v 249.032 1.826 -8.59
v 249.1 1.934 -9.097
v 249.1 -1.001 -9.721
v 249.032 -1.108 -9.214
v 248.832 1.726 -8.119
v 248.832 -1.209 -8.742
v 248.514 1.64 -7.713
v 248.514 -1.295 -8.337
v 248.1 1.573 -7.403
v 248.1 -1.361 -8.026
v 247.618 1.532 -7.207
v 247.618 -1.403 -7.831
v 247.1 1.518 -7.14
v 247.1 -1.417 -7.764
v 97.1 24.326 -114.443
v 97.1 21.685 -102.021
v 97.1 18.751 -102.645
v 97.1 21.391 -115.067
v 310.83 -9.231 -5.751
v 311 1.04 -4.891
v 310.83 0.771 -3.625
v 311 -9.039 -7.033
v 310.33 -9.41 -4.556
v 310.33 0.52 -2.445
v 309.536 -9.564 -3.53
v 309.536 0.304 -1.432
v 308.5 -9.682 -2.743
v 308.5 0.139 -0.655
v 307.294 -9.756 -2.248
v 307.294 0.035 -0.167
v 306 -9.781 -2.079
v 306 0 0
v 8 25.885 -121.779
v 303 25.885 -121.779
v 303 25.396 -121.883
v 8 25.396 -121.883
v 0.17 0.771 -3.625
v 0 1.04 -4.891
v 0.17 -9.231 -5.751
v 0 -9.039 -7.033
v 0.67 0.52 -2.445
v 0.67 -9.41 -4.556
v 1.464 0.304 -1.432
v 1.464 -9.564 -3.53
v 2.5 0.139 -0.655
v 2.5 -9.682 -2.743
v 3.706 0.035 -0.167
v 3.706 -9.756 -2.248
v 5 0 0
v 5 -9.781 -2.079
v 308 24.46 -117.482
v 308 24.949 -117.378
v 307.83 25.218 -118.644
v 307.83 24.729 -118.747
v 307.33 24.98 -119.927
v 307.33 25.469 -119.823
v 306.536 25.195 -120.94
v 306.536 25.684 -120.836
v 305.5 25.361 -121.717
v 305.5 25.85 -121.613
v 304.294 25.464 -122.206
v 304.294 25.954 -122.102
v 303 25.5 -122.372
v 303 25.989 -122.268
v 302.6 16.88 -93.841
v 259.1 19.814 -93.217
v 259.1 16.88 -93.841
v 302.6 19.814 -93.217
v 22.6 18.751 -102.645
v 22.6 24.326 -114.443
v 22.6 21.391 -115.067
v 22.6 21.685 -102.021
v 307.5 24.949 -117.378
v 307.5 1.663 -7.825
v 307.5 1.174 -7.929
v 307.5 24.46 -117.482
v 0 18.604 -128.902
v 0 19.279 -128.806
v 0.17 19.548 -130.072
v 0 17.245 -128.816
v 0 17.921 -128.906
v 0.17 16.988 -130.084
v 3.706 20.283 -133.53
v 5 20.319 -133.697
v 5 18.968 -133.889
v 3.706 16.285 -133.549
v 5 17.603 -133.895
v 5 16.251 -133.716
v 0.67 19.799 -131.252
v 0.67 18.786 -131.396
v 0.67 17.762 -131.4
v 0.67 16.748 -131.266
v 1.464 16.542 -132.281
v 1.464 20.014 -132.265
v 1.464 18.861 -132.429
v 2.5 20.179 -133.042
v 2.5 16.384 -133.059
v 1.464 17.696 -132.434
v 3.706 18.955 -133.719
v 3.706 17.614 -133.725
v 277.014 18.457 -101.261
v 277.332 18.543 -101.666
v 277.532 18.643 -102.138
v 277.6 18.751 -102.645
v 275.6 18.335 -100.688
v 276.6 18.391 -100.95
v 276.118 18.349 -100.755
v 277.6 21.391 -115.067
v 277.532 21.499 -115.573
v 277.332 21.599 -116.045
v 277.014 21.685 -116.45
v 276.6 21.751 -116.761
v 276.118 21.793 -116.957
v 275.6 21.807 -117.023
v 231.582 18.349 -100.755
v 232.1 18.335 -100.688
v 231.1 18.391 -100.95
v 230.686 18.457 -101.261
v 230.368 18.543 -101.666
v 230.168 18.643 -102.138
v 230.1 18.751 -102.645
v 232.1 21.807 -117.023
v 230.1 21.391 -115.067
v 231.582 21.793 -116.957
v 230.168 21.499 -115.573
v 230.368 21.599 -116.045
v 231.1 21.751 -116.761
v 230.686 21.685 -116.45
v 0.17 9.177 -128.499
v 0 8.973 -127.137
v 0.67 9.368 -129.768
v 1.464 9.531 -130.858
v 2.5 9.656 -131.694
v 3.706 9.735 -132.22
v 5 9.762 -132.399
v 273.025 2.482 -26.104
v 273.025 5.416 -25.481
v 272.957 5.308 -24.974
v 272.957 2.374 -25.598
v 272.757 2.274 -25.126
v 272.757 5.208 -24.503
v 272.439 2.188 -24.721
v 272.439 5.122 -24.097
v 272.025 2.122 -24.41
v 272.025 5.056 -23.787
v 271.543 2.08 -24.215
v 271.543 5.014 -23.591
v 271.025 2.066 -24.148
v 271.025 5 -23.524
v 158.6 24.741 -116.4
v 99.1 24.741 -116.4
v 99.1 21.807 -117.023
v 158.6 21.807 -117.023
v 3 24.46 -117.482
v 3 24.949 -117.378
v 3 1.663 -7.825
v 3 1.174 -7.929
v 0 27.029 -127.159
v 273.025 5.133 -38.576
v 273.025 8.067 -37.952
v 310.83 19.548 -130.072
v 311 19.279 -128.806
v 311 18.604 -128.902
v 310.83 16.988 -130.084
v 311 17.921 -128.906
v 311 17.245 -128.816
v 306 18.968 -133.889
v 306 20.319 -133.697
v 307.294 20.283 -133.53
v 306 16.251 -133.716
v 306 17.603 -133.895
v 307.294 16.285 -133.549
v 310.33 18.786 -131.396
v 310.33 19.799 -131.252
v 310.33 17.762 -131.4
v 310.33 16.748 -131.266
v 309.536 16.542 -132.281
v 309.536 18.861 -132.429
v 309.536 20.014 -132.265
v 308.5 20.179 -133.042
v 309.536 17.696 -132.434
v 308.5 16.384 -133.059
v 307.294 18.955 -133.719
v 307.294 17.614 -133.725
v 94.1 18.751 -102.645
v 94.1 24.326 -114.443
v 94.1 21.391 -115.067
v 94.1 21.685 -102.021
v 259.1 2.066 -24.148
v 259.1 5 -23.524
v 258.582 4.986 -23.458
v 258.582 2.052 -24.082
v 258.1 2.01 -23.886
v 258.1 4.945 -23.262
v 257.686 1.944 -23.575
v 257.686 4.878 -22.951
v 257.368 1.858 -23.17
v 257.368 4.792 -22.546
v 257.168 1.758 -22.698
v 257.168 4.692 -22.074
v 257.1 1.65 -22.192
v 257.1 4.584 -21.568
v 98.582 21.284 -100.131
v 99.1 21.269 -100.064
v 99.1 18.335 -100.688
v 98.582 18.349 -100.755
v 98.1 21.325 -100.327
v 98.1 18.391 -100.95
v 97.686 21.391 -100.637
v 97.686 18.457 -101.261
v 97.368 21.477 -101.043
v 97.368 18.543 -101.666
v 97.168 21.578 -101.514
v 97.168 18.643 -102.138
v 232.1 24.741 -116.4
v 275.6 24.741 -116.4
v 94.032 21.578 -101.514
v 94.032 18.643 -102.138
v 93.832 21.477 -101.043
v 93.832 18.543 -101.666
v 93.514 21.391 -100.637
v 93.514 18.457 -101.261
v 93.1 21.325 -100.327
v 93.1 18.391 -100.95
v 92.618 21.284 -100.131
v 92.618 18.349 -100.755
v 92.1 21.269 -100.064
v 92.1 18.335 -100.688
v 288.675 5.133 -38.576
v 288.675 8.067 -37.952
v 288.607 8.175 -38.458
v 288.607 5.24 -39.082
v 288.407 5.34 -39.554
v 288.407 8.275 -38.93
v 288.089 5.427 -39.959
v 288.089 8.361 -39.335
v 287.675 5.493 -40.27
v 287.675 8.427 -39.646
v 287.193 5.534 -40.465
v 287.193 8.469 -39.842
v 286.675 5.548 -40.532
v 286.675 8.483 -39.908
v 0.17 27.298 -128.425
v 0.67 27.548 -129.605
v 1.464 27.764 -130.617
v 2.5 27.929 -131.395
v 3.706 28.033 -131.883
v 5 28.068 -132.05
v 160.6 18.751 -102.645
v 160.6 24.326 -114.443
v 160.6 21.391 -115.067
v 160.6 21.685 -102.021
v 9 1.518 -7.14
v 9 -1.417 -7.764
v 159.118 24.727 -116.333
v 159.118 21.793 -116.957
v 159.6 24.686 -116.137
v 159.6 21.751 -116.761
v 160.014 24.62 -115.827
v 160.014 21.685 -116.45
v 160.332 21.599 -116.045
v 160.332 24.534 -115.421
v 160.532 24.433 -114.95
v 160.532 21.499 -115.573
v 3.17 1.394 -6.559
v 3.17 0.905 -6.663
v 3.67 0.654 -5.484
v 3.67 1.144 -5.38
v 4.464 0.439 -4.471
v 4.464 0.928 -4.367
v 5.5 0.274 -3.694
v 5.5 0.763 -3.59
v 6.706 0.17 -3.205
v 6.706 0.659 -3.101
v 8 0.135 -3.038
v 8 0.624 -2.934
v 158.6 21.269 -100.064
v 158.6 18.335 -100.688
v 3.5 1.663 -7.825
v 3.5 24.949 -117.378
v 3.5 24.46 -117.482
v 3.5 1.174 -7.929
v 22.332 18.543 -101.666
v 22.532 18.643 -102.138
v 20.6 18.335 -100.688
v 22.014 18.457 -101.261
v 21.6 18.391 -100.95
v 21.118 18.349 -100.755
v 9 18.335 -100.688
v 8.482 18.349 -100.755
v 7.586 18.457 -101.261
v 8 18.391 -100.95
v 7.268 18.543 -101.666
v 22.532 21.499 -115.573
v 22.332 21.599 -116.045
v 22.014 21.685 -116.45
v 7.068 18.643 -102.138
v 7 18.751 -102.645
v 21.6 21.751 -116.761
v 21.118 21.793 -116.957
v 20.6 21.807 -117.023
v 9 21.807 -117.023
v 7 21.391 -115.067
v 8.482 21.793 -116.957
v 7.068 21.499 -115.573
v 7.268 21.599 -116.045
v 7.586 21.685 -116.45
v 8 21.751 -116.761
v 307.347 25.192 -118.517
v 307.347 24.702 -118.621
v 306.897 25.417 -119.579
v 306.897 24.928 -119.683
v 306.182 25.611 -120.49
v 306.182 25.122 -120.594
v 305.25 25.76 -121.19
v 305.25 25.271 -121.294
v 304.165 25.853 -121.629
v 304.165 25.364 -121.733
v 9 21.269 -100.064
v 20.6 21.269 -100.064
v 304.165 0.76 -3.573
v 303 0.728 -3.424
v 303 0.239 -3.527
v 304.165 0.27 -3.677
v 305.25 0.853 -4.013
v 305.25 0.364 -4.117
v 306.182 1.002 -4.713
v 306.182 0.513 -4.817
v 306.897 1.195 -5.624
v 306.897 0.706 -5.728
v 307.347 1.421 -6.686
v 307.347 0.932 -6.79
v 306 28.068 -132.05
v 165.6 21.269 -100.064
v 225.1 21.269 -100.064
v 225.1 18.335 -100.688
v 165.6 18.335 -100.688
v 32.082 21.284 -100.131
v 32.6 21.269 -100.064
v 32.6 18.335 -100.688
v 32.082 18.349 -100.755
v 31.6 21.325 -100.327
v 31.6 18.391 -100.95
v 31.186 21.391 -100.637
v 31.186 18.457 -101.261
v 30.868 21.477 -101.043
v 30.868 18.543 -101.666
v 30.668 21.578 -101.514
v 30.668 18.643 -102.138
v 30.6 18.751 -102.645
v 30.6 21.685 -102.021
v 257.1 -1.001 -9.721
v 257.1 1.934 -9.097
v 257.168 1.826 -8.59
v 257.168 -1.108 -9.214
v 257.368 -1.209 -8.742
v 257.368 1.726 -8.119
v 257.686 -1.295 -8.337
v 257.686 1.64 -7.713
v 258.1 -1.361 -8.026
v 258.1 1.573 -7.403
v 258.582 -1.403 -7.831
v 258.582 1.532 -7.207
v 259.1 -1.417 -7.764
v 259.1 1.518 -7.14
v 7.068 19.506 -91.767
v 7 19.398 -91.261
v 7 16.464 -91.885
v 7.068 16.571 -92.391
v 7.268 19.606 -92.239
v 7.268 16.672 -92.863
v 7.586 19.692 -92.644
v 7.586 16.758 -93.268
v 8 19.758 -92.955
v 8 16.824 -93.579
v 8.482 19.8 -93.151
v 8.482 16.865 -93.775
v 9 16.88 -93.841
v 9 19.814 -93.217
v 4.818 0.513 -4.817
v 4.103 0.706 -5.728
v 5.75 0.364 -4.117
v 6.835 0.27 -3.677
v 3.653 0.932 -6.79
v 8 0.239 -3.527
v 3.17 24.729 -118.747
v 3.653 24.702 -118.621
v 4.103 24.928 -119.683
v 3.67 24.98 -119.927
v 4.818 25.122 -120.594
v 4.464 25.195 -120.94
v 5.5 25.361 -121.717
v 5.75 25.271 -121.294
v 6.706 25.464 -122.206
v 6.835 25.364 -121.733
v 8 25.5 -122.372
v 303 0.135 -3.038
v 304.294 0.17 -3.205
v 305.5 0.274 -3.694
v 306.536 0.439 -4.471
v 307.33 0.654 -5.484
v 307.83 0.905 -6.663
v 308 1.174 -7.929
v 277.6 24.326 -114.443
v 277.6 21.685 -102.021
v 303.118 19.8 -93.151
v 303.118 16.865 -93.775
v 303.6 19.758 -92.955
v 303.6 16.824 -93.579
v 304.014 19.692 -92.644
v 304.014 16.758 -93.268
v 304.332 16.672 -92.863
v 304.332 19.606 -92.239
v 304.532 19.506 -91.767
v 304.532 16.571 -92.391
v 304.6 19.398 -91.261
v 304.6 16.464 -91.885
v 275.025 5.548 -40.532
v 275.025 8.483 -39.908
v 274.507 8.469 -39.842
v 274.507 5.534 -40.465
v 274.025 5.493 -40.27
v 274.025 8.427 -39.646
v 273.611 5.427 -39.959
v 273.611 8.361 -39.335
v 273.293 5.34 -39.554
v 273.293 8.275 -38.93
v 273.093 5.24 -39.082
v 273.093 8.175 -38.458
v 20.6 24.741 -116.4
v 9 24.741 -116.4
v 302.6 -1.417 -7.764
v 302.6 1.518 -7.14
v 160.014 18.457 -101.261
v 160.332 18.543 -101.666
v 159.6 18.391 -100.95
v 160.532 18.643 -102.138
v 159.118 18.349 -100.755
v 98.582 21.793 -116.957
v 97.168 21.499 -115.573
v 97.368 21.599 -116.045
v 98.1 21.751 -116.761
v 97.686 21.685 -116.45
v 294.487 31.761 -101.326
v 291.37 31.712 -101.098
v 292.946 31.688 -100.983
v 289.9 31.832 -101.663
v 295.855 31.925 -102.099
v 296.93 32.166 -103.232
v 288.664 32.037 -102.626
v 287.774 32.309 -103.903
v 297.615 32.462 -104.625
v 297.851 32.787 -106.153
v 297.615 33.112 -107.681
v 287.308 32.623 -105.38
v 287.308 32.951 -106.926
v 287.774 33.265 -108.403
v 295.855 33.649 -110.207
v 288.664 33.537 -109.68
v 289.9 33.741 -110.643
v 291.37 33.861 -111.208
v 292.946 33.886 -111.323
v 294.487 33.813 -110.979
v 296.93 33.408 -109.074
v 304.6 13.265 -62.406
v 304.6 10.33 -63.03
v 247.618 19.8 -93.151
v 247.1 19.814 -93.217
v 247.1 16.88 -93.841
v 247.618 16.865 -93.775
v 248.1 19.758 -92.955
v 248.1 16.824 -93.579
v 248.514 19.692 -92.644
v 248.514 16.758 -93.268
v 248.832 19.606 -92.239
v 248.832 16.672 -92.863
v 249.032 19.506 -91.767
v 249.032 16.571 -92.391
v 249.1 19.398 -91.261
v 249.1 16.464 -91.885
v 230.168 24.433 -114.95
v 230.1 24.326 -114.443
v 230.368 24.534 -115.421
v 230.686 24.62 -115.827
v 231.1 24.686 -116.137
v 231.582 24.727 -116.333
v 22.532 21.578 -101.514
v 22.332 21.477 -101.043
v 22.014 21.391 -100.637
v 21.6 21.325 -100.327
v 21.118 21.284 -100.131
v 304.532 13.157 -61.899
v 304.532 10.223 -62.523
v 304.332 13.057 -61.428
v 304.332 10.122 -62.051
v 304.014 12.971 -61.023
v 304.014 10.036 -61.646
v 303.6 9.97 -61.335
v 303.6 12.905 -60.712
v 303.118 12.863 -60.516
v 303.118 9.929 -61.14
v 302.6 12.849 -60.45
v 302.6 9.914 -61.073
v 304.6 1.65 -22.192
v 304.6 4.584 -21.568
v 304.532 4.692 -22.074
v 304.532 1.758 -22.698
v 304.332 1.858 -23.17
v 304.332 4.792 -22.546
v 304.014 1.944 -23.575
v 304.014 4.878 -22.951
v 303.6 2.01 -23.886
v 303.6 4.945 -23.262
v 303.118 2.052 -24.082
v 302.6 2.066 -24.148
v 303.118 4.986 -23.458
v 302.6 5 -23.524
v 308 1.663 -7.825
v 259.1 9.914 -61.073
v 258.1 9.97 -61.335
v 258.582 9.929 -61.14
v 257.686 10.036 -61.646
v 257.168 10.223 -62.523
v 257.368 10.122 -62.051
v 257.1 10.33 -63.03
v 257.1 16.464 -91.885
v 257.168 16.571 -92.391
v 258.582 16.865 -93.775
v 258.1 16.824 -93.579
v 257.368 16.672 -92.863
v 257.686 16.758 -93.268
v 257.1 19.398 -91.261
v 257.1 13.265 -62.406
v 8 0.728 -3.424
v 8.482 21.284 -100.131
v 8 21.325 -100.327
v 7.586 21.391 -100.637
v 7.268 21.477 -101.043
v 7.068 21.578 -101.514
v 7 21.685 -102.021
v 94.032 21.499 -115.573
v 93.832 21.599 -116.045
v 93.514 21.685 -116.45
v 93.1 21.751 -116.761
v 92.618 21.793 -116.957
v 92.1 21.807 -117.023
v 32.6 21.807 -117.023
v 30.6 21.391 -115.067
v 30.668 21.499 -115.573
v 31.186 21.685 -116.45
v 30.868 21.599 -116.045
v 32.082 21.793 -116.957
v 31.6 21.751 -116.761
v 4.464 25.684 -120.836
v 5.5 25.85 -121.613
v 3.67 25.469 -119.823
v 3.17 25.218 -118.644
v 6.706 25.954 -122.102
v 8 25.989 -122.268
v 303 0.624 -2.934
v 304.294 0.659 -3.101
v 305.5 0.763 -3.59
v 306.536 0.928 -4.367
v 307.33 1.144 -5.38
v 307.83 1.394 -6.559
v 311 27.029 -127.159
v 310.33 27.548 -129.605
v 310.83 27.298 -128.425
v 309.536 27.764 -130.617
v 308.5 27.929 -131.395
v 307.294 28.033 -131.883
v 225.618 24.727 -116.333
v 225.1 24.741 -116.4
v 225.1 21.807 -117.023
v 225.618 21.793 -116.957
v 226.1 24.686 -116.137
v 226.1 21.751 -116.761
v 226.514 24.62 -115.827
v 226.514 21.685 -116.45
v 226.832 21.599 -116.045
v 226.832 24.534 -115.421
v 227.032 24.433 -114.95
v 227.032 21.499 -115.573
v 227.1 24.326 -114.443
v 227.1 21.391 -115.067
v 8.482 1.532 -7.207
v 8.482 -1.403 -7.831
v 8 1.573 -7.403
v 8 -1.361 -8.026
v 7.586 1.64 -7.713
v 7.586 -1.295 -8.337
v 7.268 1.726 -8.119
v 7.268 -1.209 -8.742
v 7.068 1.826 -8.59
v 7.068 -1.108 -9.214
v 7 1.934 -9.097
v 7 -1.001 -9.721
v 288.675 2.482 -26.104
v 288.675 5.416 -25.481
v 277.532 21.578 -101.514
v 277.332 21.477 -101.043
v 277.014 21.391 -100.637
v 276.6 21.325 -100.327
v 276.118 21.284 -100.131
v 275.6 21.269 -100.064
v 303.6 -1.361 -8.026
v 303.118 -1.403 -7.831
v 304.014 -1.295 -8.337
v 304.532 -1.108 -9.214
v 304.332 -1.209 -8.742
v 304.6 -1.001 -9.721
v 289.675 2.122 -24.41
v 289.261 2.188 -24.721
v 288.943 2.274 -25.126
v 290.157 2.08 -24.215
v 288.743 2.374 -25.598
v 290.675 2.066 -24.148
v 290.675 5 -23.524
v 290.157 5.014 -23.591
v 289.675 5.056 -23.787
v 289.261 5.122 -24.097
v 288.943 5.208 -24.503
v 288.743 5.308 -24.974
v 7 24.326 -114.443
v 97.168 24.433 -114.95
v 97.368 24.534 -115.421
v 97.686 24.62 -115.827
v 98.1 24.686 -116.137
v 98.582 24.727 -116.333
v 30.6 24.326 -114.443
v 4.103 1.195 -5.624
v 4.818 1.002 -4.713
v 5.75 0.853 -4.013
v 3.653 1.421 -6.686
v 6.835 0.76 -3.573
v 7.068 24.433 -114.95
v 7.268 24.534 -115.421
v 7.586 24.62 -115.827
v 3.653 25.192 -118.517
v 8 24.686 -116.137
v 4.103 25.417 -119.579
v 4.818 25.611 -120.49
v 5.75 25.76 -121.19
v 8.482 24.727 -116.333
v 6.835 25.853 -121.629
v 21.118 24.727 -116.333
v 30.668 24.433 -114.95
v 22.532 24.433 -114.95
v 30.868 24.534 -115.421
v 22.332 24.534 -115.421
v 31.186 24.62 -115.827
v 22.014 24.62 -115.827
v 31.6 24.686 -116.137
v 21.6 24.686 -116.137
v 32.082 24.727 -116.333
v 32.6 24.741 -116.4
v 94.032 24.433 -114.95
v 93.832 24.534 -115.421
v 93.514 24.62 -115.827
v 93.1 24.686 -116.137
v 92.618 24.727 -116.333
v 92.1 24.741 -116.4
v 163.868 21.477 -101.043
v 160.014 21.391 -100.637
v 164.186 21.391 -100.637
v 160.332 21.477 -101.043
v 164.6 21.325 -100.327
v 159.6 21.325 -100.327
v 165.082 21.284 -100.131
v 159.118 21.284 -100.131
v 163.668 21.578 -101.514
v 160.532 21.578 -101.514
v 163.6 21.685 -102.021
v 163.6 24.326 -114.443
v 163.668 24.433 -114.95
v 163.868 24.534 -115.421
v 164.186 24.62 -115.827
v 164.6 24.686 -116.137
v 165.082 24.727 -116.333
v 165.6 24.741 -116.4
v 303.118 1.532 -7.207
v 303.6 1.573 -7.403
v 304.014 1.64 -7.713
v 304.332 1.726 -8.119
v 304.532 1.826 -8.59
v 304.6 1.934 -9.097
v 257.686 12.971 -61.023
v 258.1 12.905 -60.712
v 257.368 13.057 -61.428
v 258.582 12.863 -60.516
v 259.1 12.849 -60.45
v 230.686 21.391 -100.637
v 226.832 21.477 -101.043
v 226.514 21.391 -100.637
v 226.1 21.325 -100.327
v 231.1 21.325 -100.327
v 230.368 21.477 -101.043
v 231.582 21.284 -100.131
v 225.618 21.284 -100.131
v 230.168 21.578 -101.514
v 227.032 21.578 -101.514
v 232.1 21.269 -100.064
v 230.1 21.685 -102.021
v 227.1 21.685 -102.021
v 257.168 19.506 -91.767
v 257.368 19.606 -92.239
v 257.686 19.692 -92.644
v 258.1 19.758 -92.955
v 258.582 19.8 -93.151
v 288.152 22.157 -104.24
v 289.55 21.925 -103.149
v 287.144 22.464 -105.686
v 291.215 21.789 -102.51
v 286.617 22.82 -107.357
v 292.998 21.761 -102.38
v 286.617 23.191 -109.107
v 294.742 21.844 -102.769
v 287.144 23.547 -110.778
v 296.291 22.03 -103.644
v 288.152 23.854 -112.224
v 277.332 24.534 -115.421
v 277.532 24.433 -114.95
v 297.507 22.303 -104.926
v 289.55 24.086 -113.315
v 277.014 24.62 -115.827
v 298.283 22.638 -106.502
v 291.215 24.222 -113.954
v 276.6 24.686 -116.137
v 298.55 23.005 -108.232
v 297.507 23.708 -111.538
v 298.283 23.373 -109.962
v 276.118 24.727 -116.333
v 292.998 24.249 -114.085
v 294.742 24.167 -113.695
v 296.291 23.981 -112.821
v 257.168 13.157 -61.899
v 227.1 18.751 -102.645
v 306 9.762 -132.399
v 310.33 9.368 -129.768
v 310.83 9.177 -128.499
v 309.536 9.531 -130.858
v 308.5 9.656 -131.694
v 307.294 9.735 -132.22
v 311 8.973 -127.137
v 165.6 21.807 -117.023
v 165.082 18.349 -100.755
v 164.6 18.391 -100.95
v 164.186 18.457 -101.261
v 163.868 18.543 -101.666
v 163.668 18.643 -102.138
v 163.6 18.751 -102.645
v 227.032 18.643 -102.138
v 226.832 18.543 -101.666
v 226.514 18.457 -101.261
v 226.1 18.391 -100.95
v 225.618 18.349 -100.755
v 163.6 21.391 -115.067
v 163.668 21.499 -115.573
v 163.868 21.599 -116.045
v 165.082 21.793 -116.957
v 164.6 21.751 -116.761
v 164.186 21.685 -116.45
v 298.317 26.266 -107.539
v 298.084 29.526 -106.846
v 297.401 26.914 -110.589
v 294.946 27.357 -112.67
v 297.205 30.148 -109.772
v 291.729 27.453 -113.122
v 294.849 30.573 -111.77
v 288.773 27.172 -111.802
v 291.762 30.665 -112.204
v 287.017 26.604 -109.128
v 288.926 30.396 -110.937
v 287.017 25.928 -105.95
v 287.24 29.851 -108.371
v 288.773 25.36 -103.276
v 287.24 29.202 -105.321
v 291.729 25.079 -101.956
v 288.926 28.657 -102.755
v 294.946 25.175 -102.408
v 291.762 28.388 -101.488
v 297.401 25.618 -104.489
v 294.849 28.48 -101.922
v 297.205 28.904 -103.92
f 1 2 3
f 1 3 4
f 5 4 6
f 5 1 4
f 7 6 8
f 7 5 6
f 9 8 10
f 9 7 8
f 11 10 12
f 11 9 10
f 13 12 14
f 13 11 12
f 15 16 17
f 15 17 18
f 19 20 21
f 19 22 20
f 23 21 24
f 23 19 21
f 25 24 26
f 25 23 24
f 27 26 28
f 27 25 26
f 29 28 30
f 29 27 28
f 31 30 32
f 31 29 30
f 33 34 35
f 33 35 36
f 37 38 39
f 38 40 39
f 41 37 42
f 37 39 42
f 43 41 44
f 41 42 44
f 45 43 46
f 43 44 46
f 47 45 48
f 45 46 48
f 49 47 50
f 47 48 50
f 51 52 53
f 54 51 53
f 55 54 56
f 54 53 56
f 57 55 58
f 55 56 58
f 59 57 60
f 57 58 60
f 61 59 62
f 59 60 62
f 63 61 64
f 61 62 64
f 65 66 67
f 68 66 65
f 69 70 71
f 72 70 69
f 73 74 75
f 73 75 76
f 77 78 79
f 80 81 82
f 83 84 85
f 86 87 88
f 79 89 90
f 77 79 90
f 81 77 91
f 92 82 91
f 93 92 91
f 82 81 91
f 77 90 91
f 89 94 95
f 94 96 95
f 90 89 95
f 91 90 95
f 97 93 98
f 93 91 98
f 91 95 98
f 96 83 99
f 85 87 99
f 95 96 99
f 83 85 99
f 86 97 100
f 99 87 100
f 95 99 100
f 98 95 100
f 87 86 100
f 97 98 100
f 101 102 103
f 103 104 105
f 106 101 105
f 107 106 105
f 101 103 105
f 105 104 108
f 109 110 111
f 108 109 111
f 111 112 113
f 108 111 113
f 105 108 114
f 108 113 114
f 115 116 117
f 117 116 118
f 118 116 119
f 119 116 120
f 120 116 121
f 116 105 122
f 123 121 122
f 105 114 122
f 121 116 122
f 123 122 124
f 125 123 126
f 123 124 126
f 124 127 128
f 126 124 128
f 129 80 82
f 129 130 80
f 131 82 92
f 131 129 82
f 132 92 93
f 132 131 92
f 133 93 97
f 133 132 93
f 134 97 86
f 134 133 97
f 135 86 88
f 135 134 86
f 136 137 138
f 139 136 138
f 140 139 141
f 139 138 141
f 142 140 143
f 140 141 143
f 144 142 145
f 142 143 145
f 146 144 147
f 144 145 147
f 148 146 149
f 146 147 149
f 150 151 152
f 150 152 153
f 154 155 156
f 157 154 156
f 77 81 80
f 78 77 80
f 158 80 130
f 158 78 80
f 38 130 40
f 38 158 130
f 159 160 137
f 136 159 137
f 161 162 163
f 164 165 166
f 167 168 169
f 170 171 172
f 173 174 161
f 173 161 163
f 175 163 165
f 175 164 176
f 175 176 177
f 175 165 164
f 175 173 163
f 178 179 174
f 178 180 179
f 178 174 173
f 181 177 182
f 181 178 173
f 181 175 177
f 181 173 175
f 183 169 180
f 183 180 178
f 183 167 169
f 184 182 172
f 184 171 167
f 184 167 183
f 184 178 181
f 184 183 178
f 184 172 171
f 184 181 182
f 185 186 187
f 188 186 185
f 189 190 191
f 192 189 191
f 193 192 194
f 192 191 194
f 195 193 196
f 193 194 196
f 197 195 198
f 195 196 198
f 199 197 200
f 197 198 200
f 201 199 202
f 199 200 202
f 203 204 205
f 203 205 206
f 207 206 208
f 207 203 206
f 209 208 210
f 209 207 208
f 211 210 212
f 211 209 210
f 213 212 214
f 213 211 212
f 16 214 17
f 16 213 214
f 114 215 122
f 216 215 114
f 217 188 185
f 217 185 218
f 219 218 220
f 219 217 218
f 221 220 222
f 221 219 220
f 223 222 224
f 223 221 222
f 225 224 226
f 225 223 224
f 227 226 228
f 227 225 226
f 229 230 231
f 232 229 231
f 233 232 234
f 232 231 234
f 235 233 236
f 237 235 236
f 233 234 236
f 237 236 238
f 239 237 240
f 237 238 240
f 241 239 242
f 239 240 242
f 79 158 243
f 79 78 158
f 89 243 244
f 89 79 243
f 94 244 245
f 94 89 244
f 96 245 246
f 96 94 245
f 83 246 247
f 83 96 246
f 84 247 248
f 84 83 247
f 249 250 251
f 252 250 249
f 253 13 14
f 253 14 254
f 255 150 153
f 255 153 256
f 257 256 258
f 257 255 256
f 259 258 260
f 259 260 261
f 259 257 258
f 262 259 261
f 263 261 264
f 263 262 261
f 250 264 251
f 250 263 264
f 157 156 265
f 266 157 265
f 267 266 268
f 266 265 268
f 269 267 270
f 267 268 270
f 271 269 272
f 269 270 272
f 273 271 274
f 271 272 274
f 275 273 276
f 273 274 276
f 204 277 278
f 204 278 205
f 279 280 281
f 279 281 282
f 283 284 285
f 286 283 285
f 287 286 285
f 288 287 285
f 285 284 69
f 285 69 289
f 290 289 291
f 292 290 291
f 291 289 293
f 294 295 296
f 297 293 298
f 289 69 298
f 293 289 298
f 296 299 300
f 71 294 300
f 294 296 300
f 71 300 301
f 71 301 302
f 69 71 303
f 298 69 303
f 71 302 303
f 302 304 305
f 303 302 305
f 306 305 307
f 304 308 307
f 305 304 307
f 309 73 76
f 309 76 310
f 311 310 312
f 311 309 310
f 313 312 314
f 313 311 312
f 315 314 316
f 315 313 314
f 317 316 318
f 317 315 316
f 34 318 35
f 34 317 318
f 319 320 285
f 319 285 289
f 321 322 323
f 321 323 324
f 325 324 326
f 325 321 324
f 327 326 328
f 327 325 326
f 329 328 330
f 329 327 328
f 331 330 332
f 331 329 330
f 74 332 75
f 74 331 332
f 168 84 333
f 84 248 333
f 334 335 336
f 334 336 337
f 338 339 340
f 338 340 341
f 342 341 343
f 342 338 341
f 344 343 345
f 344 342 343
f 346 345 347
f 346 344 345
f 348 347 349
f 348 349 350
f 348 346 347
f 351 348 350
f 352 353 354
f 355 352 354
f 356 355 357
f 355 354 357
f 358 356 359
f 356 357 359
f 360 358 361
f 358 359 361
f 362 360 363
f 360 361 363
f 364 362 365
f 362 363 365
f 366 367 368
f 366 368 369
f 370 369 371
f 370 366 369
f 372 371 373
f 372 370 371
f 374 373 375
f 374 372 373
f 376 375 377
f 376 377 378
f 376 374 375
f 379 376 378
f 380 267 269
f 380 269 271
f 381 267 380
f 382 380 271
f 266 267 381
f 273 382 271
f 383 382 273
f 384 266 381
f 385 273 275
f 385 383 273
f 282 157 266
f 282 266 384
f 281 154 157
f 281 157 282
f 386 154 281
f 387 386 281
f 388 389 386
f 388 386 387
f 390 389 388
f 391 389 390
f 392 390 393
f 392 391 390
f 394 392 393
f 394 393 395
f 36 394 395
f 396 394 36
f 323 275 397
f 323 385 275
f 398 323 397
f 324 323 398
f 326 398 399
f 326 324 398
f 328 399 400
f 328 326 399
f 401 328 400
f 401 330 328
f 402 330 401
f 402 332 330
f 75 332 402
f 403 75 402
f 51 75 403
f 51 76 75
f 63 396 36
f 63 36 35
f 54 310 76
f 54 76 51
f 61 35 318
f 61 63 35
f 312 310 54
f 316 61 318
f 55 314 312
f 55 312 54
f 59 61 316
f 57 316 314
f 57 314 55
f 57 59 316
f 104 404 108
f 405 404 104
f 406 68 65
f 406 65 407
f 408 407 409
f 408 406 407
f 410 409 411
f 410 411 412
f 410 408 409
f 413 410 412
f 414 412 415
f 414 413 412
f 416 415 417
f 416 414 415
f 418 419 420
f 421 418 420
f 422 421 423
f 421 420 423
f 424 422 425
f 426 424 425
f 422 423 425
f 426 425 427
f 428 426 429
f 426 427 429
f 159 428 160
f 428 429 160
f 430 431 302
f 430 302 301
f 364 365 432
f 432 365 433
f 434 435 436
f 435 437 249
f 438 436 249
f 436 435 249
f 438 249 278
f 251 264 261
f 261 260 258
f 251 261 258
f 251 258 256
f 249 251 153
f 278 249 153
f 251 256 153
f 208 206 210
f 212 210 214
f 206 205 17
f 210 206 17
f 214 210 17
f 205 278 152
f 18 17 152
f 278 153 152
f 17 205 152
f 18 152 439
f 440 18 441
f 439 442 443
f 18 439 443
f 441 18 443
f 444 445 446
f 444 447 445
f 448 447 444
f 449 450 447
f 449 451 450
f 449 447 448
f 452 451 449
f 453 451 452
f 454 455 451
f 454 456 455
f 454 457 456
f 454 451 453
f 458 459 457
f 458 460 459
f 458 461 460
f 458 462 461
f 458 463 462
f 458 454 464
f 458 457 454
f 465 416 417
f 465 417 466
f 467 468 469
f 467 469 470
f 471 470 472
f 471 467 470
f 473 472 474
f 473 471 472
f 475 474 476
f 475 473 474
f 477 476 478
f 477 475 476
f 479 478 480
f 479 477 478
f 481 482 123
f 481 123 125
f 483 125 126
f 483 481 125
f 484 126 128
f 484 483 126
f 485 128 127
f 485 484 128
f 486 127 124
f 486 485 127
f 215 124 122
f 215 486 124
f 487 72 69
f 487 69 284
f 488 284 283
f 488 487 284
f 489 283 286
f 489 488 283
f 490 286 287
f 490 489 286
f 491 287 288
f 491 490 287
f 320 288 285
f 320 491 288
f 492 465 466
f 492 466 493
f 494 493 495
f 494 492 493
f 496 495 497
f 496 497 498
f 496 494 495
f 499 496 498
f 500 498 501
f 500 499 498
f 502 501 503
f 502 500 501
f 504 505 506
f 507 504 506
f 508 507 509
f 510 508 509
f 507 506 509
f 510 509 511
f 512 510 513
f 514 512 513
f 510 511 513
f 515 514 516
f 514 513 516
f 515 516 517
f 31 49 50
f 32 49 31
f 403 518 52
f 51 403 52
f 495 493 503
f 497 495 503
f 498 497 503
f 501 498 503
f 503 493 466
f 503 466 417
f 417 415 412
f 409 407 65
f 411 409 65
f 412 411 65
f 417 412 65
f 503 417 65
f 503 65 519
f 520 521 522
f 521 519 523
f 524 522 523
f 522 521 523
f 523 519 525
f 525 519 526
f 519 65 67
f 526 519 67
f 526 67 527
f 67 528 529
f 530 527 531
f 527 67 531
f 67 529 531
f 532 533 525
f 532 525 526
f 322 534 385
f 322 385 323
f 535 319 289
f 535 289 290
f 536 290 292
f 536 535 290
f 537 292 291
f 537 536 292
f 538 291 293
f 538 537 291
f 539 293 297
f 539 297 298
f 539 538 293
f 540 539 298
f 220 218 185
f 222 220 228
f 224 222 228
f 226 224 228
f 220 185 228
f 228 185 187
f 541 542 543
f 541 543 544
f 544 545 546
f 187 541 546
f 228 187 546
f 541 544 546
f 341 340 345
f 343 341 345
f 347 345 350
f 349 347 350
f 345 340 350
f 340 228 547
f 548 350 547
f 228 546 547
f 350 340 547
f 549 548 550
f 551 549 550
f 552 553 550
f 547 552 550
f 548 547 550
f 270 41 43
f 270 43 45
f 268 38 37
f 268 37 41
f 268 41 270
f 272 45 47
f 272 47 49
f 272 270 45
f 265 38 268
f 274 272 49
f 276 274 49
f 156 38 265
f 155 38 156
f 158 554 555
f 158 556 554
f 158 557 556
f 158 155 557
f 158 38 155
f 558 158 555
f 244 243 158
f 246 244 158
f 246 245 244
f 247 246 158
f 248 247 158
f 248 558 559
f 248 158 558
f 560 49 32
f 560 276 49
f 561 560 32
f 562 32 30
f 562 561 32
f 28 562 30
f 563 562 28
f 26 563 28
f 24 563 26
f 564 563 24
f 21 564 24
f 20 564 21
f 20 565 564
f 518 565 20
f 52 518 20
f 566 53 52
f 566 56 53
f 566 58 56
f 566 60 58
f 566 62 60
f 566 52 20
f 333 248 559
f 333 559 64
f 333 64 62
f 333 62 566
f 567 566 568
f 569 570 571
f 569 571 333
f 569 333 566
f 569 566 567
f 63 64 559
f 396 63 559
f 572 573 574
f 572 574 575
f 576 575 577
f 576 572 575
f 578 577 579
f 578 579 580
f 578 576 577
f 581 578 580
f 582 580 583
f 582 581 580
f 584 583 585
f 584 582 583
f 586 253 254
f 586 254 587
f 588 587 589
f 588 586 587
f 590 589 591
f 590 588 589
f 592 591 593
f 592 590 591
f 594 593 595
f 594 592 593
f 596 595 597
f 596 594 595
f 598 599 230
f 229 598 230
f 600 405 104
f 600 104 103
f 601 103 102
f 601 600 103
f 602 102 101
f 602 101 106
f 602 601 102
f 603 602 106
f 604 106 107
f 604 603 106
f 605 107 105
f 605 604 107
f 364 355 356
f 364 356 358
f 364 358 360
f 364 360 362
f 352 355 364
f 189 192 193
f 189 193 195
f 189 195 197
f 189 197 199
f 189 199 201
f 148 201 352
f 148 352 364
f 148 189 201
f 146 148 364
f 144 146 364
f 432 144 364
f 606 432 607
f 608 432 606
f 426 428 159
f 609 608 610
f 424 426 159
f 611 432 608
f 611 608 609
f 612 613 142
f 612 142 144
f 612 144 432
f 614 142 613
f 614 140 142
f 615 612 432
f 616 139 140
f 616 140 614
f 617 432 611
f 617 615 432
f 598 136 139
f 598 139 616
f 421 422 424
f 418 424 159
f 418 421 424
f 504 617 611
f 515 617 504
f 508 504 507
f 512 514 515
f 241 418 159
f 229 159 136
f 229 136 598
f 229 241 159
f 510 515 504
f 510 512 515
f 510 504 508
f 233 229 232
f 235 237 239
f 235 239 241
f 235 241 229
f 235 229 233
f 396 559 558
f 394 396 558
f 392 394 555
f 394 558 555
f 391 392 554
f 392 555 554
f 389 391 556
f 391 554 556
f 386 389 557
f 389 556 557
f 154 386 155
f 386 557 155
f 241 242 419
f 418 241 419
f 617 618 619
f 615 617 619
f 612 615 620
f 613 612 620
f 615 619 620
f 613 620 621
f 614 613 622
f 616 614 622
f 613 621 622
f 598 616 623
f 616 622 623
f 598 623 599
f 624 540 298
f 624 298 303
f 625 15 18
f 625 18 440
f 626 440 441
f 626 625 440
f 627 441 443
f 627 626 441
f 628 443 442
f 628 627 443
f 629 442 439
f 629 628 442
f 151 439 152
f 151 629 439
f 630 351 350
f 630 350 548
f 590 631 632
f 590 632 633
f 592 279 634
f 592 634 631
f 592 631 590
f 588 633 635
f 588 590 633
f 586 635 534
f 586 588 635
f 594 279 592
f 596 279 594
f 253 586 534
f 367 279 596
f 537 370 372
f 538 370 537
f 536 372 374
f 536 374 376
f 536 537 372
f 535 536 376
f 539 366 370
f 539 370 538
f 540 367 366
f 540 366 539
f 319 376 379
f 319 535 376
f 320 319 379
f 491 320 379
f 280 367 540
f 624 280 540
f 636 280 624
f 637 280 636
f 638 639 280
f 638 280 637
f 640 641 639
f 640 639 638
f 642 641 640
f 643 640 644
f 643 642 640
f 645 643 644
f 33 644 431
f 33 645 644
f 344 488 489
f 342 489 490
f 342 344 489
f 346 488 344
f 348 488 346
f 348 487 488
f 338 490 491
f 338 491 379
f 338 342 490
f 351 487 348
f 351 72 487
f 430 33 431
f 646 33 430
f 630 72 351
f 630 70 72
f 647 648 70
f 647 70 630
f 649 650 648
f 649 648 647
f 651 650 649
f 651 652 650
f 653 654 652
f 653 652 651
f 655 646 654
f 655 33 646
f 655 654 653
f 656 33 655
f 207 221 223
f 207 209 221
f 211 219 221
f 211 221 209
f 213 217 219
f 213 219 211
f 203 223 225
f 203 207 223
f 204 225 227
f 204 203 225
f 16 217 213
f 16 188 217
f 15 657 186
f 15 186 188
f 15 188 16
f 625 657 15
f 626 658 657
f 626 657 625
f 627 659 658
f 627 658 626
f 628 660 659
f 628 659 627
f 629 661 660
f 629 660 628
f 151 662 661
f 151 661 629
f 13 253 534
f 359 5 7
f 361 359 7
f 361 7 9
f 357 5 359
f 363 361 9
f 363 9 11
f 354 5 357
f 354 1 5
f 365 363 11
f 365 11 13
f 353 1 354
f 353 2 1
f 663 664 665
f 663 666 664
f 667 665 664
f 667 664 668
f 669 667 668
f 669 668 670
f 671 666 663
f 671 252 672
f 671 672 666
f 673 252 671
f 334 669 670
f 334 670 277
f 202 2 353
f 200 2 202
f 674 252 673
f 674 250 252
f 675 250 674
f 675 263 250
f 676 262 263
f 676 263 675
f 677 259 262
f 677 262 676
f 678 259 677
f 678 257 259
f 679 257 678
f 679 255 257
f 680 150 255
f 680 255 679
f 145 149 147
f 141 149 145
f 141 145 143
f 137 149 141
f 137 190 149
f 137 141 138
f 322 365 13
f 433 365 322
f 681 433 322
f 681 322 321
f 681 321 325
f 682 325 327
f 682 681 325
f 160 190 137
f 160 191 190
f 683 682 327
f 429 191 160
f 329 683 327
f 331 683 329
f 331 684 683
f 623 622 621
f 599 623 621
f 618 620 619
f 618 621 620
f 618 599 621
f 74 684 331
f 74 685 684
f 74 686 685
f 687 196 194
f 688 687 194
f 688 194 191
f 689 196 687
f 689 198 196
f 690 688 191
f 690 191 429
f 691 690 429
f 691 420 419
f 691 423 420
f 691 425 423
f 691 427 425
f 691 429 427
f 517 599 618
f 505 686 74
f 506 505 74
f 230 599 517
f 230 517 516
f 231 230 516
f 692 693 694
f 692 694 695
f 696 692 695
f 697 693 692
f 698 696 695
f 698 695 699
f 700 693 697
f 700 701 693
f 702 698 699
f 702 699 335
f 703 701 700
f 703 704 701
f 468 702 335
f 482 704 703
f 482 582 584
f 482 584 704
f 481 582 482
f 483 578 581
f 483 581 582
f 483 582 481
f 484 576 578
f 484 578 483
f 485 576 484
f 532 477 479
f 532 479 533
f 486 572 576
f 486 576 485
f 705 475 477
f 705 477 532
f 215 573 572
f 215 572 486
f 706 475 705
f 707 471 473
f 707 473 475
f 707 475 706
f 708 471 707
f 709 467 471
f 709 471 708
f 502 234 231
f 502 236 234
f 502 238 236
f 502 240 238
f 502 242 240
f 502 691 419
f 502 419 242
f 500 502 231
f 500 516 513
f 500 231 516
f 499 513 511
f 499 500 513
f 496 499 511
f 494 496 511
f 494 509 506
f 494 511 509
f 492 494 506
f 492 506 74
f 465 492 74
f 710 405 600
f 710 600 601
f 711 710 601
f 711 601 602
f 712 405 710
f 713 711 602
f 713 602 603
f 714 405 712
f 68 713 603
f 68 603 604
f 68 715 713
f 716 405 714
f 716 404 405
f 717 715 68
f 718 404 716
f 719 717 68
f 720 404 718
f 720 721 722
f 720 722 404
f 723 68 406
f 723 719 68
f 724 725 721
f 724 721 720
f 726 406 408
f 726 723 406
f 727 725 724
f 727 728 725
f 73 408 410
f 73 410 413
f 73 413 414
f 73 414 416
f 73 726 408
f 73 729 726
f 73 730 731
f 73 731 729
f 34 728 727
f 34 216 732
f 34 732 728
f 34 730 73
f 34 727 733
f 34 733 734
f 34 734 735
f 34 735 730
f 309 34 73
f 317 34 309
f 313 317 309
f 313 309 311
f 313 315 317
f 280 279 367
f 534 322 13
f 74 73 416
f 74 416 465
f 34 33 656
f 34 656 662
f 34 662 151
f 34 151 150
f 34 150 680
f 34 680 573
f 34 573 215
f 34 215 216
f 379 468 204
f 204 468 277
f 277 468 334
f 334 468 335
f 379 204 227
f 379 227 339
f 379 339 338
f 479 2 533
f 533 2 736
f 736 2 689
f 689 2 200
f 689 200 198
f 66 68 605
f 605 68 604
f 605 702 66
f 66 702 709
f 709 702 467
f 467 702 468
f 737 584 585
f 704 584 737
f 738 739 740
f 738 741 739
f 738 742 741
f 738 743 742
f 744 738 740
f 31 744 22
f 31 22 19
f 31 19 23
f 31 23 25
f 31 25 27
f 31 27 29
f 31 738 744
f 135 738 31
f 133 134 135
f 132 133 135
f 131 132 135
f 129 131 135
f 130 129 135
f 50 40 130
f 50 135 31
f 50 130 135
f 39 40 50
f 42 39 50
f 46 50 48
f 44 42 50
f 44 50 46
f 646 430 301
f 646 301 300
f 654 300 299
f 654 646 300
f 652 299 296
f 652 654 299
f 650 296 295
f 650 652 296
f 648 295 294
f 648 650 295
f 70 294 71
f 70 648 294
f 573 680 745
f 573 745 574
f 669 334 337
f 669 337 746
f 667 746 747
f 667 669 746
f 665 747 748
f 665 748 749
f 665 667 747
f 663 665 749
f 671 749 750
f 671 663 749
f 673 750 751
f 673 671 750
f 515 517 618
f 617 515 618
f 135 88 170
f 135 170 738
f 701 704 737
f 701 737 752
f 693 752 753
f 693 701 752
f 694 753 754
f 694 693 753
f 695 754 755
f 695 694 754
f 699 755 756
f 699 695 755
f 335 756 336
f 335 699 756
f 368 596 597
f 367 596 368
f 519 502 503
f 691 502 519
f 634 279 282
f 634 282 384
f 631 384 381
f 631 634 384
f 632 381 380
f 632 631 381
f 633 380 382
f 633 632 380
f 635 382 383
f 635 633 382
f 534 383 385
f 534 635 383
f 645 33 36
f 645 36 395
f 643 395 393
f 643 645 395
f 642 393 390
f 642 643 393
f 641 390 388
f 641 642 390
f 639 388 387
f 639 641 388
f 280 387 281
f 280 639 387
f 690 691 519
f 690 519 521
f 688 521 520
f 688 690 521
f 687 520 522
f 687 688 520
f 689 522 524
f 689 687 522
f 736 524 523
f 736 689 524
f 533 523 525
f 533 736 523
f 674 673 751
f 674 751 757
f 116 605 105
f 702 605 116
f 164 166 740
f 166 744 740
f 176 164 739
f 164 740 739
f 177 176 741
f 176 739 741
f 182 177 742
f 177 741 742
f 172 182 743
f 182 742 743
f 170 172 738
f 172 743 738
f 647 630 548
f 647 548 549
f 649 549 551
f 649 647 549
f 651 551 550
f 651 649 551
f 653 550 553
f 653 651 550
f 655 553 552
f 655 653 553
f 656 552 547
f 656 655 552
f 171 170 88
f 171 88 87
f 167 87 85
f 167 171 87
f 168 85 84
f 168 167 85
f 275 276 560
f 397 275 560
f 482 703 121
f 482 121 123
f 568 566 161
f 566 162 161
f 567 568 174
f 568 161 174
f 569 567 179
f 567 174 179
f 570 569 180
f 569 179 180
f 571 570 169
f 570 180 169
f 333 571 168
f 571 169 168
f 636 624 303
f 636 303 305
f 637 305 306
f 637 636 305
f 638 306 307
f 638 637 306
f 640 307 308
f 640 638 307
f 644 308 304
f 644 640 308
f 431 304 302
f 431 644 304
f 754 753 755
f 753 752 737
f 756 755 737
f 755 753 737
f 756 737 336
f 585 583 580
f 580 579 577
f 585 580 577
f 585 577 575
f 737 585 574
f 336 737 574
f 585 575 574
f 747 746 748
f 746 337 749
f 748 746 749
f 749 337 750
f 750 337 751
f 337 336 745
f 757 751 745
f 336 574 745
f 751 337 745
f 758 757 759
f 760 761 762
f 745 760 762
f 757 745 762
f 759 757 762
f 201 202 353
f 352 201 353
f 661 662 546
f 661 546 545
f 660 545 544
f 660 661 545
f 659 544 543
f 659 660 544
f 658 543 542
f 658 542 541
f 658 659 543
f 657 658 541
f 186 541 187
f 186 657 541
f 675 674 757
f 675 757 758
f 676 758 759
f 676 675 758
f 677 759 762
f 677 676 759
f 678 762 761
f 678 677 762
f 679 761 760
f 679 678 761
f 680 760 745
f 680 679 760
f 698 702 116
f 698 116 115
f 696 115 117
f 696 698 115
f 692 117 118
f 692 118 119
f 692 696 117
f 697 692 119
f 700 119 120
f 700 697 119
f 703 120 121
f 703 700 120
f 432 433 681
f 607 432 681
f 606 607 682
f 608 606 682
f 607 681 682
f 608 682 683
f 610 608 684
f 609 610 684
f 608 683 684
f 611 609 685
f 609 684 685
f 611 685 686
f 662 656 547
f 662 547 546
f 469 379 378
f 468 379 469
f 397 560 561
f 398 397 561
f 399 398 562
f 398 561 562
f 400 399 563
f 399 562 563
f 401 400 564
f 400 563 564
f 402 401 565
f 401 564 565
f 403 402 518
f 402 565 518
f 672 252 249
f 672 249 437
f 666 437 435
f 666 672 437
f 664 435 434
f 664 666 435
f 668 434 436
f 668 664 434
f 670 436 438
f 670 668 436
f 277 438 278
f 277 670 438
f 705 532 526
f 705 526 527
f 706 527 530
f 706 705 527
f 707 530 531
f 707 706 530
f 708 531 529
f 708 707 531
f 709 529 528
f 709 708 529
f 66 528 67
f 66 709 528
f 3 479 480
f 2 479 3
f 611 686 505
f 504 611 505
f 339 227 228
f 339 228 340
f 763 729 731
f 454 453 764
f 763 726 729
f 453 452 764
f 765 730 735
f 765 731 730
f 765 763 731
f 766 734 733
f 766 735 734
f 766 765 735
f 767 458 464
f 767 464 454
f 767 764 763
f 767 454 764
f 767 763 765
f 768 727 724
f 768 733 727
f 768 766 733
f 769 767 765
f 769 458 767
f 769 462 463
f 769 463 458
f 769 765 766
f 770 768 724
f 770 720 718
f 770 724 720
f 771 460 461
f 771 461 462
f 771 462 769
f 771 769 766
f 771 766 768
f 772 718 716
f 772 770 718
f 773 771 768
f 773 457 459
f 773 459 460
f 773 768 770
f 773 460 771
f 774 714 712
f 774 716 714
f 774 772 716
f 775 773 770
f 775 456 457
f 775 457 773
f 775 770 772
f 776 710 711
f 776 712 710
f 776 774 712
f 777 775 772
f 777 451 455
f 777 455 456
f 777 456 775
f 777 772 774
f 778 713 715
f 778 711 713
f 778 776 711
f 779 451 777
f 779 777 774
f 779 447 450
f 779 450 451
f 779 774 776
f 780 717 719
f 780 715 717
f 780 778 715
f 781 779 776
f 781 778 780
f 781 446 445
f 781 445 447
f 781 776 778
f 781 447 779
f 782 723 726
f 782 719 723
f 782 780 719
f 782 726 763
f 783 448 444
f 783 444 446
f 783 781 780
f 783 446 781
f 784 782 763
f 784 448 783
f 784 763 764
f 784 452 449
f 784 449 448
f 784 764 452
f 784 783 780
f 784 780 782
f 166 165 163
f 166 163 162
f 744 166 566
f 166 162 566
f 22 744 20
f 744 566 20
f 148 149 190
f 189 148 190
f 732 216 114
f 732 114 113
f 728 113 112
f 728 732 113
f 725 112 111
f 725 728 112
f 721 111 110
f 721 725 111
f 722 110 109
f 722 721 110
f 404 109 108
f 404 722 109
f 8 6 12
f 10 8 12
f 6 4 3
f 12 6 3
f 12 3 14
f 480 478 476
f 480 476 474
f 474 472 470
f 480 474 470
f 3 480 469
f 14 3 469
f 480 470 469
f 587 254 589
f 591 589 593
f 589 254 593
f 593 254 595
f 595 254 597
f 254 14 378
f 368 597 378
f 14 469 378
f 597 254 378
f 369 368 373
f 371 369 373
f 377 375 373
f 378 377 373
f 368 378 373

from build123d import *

# Parameters (mm, degrees)
SKETCH2_W               = 311
SKETCH2_H               = 135
BOSS_EXTRUDE1_DEPTH     = 10
BOSS_EXTRUDE2_DEPTH     = 311
FILLET1_R               = 10
FILLET2_R               = 5
CUT_EXTRUDE_THIN1_DEPTH = 0.5
CUT_EXTRUDE1_DEPTH      = 3
SKETCH8_R               = 6
BOSS_EXTRUDE3_DEPTH     = 10
BOSS_EXTRUDE3_TAPER     = 4


with BuildPart() as part:
    # Sketch2 → Boss-Extrude1 (new body)
    with BuildSketch(Plane(origin=(0, 0, 0), x_dir=(1, 0, 0), z_dir=(0, 0.9781476007338056, 0.2079116908177598))):
        with Locations((155.5, 67.5)):
            Rectangle(SKETCH2_W, SKETCH2_H)
    extrude(amount=-BOSS_EXTRUDE1_DEPTH)

    # Sketch5 → Boss-Extrude2 (add)
    with BuildSketch(Plane.ZY):
        Polygon((-134.129043007, 18.286602253), (-132.399185443, 9.762104074), (-2.079116908, -9.781476007), align=None)
    extrude(amount=-BOSS_EXTRUDE2_DEPTH)

    # Fillet1
    fillet1_edges = [part.edges().sort_by_distance(p)[0] for p in [
        (155.5, 18.286602253, -134.129043007),
    ]]
    fillet(fillet1_edges, radius=FILLET1_R)

    # Fillet2
    fillet2_edges = [part.edges().sort_by_distance(p)[0] for p in [
        (311, 24.193330233, -132.873529217),
        (0, 24.193330233, -132.873529217),
        (0, 13.006413151, -133.057545909),
        (0, 18.285616937, -133.915549829),
        (311, 13.006413151, -133.057545909),
        (311, 18.285616937, -133.915549829),
        (311, -4.890738004, -1.039558454),
        (0, -4.890738004, -1.039558454),
    ]]
    fillet(fillet2_edges, radius=FILLET2_R)

    # Sketch6 → Cut-Extrude-Thin1 (cut)
    # profile 1 of 2: a face of its own
    with BuildSketch(Plane(origin=(0, 0, 0), x_dir=(1, 0, 0), z_dir=(0, 0.9781476007338056, 0.20791169081775976))):
        with BuildLine():
            Line((3, 120), (3, 8))
            ThreePointArc((3, 8), (4.464466094, 4.464466094), (8, 3))
            Line((8, 3), (303, 3))
            ThreePointArc((303, 3), (306.535533906, 4.464466094), (308, 8))
            Line((308, 8), (308, 120))
            ThreePointArc((308, 120), (306.535533906, 123.535533906), (303, 125))
            Line((303, 125), (8, 125))
            ThreePointArc((8, 125), (4.464466094, 123.535533906), (3, 120))
        make_face()
        with BuildLine():
            Line((3.5, 120), (3.5, 8))
            ThreePointArc((3.5, 8), (4.818019485, 4.818019485), (8, 3.5))
            Line((8, 3.5), (303, 3.5))
            ThreePointArc((303, 3.5), (306.181980515, 4.818019485), (307.5, 8))
            Line((307.5, 8), (307.5, 120))
            ThreePointArc((307.5, 120), (306.181980515, 123.181980515), (303, 124.5))
            Line((303, 124.5), (8, 124.5))
            ThreePointArc((8, 124.5), (4.818019485, 123.181980515), (3.5, 120))
        make_face(mode=Mode.SUBTRACT)
    # profile 2 of 2: a face of its own
    with BuildSketch(Plane(origin=(0, 0, 0), x_dir=(1, 0, 0), z_dir=(0, 0.9781476007338056, 0.20791169081775976))):
        with BuildLine():
            ThreePointArc((15, 10), (11.464466094, 11.464466094), (10, 15))
            Line((10, 15), (9.5, 15))
            ThreePointArc((9.5, 15), (11.110912703, 11.110912703), (15, 9.5))
            Line((15, 9.5), (15, 10))
        make_face()
    extrude(amount=-CUT_EXTRUDE_THIN1_DEPTH, mode=Mode.SUBTRACT)

    # Sketch7 → Cut-Extrude1 (cut)
    with BuildSketch(Plane(origin=(0, 0, 0), x_dir=(1, 0, 0), z_dir=(0, 0.9781476007338056, 0.20791169081775976))):
        with BuildLine():
            Line((9, 119), (20.6, 119))
            ThreePointArc((20.6, 119), (22.014213562, 118.414213562), (22.6, 117))
            Line((22.6, 117), (22.6, 104.3))
            ThreePointArc((22.6, 104.3), (22.014213562, 102.885786438), (20.6, 102.3))
            Line((20.6, 102.3), (9, 102.3))
            ThreePointArc((9, 102.3), (7.585786438, 102.885786438), (7, 104.3))
            Line((7, 104.3), (7, 117))
            ThreePointArc((7, 117), (7.585786438, 118.414213562), (9, 119))
        make_face()
        with BuildLine():
            Line((302.6, 24.05), (290.675, 24.05))
            ThreePointArc((290.675, 24.05), (289.260786438, 24.635786438), (288.675, 26.05))
            Line((288.675, 26.05), (288.675, 38.8))
            ThreePointArc((288.675, 38.8), (288.089213562, 40.214213562), (286.675, 40.8))
            Line((286.675, 40.8), (275.025, 40.8))
            ThreePointArc((275.025, 40.8), (273.610786438, 40.214213562), (273.025, 38.8))
            Line((273.025, 38.8), (273.025, 26.05))
            ThreePointArc((273.025, 26.05), (272.439213562, 24.635786438), (271.025, 24.05))
            Line((271.025, 24.05), (259.1, 24.05))
            ThreePointArc((259.1, 24.05), (257.685786438, 23.464213562), (257.1, 22.05))
            Line((257.1, 22.05), (257.1, 9.3))
            ThreePointArc((257.1, 9.3), (257.685786438, 7.885786438), (259.1, 7.3))
            Line((259.1, 7.3), (302.6, 7.3))
            ThreePointArc((302.6, 7.3), (304.014213562, 7.885786438), (304.6, 9.3))
            Line((304.6, 9.3), (304.6, 22.05))
            ThreePointArc((304.6, 22.05), (304.014213562, 23.464213562), (302.6, 24.05))
        make_face()
        with BuildLine():
            Line((32.6, 119), (92.1, 119))
            ThreePointArc((92.1, 119), (93.514213562, 118.414213562), (94.1, 117))
            Line((94.1, 117), (94.1, 104.3))
            ThreePointArc((94.1, 104.3), (93.514213562, 102.885786438), (92.1, 102.3))
            Line((92.1, 102.3), (32.6, 102.3))
            ThreePointArc((32.6, 102.3), (31.185786438, 102.885786438), (30.6, 104.3))
            Line((30.6, 104.3), (30.6, 117))
            ThreePointArc((30.6, 117), (31.185786438, 118.414213562), (32.6, 119))
        make_face()
        with BuildLine():
            Line((99.1, 119), (158.6, 119))
            ThreePointArc((158.6, 119), (160.014213562, 118.414213562), (160.6, 117))
            Line((160.6, 117), (160.6, 104.3))
            ThreePointArc((160.6, 104.3), (160.014213562, 102.885786438), (158.6, 102.3))
            Line((158.6, 102.3), (99.1, 102.3))
            ThreePointArc((99.1, 102.3), (97.685786438, 102.885786438), (97.1, 104.3))
            Line((97.1, 104.3), (97.1, 117))
            ThreePointArc((97.1, 117), (97.685786438, 118.414213562), (99.1, 119))
        make_face()
        with BuildLine():
            Line((165.6, 119), (225.1, 119))
            ThreePointArc((225.1, 119), (226.514213562, 118.414213562), (227.1, 117))
            Line((227.1, 117), (227.1, 104.3))
            ThreePointArc((227.1, 104.3), (226.514213562, 102.885786438), (225.1, 102.3))
            Line((225.1, 102.3), (165.6, 102.3))
            ThreePointArc((165.6, 102.3), (164.185786438, 102.885786438), (163.6, 104.3))
            Line((163.6, 104.3), (163.6, 117))
            ThreePointArc((163.6, 117), (164.185786438, 118.414213562), (165.6, 119))
        make_face()
        with BuildLine():
            Line((232.1, 119), (275.6, 119))
            ThreePointArc((275.6, 119), (277.014213562, 118.414213562), (277.6, 117))
            Line((277.6, 117), (277.6, 104.3))
            ThreePointArc((277.6, 104.3), (277.014213562, 102.885786438), (275.6, 102.3))
            Line((275.6, 102.3), (232.1, 102.3))
            ThreePointArc((232.1, 102.3), (230.685786438, 102.885786438), (230.1, 104.3))
            Line((230.1, 104.3), (230.1, 117))
            ThreePointArc((230.1, 117), (230.685786438, 118.414213562), (232.1, 119))
        make_face()
        with BuildLine():
            Line((9, 95.3), (247.1, 95.3))
            ThreePointArc((247.1, 95.3), (248.514213562, 94.714213562), (249.1, 93.3))
            Line((249.1, 93.3), (249.1, 9.3))
            ThreePointArc((249.1, 9.3), (248.514213562, 7.885786438), (247.1, 7.3))
            Line((247.1, 7.3), (9, 7.3))
            ThreePointArc((9, 7.3), (7.585786438, 7.885786438), (7, 9.3))
            Line((7, 9.3), (7, 93.3))
            ThreePointArc((7, 93.3), (7.585786438, 94.714213562), (9, 95.3))
        make_face()
        with BuildLine():
            Line((259.1, 95.3), (302.6, 95.3))
            ThreePointArc((302.6, 95.3), (304.014213562, 94.714213562), (304.6, 93.3))
            Line((304.6, 93.3), (304.6, 63.8))
            ThreePointArc((304.6, 63.8), (304.014213562, 62.385786438), (302.6, 61.8))
            Line((302.6, 61.8), (259.1, 61.8))
            ThreePointArc((259.1, 61.8), (257.685786438, 62.385786438), (257.1, 63.8))
            Line((257.1, 63.8), (257.1, 93.3))
            ThreePointArc((257.1, 93.3), (257.685786438, 94.714213562), (259.1, 95.3))
        make_face()
    extrude(amount=-CUT_EXTRUDE1_DEPTH, mode=Mode.SUBTRACT)

    # Sketch8 → Boss-Extrude3 (add)
    with BuildSketch(Plane(origin=(0, 0, 0), x_dir=(1, 0, 0), z_dir=(0, 0.9781476007338055, 0.20791169081775973))):
        with Locations((292.55, 110.65)):
            Circle(SKETCH8_R)
    extrude(amount=BOSS_EXTRUDE3_DEPTH, taper=BOSS_EXTRUDE3_TAPER)


solid = part.part
